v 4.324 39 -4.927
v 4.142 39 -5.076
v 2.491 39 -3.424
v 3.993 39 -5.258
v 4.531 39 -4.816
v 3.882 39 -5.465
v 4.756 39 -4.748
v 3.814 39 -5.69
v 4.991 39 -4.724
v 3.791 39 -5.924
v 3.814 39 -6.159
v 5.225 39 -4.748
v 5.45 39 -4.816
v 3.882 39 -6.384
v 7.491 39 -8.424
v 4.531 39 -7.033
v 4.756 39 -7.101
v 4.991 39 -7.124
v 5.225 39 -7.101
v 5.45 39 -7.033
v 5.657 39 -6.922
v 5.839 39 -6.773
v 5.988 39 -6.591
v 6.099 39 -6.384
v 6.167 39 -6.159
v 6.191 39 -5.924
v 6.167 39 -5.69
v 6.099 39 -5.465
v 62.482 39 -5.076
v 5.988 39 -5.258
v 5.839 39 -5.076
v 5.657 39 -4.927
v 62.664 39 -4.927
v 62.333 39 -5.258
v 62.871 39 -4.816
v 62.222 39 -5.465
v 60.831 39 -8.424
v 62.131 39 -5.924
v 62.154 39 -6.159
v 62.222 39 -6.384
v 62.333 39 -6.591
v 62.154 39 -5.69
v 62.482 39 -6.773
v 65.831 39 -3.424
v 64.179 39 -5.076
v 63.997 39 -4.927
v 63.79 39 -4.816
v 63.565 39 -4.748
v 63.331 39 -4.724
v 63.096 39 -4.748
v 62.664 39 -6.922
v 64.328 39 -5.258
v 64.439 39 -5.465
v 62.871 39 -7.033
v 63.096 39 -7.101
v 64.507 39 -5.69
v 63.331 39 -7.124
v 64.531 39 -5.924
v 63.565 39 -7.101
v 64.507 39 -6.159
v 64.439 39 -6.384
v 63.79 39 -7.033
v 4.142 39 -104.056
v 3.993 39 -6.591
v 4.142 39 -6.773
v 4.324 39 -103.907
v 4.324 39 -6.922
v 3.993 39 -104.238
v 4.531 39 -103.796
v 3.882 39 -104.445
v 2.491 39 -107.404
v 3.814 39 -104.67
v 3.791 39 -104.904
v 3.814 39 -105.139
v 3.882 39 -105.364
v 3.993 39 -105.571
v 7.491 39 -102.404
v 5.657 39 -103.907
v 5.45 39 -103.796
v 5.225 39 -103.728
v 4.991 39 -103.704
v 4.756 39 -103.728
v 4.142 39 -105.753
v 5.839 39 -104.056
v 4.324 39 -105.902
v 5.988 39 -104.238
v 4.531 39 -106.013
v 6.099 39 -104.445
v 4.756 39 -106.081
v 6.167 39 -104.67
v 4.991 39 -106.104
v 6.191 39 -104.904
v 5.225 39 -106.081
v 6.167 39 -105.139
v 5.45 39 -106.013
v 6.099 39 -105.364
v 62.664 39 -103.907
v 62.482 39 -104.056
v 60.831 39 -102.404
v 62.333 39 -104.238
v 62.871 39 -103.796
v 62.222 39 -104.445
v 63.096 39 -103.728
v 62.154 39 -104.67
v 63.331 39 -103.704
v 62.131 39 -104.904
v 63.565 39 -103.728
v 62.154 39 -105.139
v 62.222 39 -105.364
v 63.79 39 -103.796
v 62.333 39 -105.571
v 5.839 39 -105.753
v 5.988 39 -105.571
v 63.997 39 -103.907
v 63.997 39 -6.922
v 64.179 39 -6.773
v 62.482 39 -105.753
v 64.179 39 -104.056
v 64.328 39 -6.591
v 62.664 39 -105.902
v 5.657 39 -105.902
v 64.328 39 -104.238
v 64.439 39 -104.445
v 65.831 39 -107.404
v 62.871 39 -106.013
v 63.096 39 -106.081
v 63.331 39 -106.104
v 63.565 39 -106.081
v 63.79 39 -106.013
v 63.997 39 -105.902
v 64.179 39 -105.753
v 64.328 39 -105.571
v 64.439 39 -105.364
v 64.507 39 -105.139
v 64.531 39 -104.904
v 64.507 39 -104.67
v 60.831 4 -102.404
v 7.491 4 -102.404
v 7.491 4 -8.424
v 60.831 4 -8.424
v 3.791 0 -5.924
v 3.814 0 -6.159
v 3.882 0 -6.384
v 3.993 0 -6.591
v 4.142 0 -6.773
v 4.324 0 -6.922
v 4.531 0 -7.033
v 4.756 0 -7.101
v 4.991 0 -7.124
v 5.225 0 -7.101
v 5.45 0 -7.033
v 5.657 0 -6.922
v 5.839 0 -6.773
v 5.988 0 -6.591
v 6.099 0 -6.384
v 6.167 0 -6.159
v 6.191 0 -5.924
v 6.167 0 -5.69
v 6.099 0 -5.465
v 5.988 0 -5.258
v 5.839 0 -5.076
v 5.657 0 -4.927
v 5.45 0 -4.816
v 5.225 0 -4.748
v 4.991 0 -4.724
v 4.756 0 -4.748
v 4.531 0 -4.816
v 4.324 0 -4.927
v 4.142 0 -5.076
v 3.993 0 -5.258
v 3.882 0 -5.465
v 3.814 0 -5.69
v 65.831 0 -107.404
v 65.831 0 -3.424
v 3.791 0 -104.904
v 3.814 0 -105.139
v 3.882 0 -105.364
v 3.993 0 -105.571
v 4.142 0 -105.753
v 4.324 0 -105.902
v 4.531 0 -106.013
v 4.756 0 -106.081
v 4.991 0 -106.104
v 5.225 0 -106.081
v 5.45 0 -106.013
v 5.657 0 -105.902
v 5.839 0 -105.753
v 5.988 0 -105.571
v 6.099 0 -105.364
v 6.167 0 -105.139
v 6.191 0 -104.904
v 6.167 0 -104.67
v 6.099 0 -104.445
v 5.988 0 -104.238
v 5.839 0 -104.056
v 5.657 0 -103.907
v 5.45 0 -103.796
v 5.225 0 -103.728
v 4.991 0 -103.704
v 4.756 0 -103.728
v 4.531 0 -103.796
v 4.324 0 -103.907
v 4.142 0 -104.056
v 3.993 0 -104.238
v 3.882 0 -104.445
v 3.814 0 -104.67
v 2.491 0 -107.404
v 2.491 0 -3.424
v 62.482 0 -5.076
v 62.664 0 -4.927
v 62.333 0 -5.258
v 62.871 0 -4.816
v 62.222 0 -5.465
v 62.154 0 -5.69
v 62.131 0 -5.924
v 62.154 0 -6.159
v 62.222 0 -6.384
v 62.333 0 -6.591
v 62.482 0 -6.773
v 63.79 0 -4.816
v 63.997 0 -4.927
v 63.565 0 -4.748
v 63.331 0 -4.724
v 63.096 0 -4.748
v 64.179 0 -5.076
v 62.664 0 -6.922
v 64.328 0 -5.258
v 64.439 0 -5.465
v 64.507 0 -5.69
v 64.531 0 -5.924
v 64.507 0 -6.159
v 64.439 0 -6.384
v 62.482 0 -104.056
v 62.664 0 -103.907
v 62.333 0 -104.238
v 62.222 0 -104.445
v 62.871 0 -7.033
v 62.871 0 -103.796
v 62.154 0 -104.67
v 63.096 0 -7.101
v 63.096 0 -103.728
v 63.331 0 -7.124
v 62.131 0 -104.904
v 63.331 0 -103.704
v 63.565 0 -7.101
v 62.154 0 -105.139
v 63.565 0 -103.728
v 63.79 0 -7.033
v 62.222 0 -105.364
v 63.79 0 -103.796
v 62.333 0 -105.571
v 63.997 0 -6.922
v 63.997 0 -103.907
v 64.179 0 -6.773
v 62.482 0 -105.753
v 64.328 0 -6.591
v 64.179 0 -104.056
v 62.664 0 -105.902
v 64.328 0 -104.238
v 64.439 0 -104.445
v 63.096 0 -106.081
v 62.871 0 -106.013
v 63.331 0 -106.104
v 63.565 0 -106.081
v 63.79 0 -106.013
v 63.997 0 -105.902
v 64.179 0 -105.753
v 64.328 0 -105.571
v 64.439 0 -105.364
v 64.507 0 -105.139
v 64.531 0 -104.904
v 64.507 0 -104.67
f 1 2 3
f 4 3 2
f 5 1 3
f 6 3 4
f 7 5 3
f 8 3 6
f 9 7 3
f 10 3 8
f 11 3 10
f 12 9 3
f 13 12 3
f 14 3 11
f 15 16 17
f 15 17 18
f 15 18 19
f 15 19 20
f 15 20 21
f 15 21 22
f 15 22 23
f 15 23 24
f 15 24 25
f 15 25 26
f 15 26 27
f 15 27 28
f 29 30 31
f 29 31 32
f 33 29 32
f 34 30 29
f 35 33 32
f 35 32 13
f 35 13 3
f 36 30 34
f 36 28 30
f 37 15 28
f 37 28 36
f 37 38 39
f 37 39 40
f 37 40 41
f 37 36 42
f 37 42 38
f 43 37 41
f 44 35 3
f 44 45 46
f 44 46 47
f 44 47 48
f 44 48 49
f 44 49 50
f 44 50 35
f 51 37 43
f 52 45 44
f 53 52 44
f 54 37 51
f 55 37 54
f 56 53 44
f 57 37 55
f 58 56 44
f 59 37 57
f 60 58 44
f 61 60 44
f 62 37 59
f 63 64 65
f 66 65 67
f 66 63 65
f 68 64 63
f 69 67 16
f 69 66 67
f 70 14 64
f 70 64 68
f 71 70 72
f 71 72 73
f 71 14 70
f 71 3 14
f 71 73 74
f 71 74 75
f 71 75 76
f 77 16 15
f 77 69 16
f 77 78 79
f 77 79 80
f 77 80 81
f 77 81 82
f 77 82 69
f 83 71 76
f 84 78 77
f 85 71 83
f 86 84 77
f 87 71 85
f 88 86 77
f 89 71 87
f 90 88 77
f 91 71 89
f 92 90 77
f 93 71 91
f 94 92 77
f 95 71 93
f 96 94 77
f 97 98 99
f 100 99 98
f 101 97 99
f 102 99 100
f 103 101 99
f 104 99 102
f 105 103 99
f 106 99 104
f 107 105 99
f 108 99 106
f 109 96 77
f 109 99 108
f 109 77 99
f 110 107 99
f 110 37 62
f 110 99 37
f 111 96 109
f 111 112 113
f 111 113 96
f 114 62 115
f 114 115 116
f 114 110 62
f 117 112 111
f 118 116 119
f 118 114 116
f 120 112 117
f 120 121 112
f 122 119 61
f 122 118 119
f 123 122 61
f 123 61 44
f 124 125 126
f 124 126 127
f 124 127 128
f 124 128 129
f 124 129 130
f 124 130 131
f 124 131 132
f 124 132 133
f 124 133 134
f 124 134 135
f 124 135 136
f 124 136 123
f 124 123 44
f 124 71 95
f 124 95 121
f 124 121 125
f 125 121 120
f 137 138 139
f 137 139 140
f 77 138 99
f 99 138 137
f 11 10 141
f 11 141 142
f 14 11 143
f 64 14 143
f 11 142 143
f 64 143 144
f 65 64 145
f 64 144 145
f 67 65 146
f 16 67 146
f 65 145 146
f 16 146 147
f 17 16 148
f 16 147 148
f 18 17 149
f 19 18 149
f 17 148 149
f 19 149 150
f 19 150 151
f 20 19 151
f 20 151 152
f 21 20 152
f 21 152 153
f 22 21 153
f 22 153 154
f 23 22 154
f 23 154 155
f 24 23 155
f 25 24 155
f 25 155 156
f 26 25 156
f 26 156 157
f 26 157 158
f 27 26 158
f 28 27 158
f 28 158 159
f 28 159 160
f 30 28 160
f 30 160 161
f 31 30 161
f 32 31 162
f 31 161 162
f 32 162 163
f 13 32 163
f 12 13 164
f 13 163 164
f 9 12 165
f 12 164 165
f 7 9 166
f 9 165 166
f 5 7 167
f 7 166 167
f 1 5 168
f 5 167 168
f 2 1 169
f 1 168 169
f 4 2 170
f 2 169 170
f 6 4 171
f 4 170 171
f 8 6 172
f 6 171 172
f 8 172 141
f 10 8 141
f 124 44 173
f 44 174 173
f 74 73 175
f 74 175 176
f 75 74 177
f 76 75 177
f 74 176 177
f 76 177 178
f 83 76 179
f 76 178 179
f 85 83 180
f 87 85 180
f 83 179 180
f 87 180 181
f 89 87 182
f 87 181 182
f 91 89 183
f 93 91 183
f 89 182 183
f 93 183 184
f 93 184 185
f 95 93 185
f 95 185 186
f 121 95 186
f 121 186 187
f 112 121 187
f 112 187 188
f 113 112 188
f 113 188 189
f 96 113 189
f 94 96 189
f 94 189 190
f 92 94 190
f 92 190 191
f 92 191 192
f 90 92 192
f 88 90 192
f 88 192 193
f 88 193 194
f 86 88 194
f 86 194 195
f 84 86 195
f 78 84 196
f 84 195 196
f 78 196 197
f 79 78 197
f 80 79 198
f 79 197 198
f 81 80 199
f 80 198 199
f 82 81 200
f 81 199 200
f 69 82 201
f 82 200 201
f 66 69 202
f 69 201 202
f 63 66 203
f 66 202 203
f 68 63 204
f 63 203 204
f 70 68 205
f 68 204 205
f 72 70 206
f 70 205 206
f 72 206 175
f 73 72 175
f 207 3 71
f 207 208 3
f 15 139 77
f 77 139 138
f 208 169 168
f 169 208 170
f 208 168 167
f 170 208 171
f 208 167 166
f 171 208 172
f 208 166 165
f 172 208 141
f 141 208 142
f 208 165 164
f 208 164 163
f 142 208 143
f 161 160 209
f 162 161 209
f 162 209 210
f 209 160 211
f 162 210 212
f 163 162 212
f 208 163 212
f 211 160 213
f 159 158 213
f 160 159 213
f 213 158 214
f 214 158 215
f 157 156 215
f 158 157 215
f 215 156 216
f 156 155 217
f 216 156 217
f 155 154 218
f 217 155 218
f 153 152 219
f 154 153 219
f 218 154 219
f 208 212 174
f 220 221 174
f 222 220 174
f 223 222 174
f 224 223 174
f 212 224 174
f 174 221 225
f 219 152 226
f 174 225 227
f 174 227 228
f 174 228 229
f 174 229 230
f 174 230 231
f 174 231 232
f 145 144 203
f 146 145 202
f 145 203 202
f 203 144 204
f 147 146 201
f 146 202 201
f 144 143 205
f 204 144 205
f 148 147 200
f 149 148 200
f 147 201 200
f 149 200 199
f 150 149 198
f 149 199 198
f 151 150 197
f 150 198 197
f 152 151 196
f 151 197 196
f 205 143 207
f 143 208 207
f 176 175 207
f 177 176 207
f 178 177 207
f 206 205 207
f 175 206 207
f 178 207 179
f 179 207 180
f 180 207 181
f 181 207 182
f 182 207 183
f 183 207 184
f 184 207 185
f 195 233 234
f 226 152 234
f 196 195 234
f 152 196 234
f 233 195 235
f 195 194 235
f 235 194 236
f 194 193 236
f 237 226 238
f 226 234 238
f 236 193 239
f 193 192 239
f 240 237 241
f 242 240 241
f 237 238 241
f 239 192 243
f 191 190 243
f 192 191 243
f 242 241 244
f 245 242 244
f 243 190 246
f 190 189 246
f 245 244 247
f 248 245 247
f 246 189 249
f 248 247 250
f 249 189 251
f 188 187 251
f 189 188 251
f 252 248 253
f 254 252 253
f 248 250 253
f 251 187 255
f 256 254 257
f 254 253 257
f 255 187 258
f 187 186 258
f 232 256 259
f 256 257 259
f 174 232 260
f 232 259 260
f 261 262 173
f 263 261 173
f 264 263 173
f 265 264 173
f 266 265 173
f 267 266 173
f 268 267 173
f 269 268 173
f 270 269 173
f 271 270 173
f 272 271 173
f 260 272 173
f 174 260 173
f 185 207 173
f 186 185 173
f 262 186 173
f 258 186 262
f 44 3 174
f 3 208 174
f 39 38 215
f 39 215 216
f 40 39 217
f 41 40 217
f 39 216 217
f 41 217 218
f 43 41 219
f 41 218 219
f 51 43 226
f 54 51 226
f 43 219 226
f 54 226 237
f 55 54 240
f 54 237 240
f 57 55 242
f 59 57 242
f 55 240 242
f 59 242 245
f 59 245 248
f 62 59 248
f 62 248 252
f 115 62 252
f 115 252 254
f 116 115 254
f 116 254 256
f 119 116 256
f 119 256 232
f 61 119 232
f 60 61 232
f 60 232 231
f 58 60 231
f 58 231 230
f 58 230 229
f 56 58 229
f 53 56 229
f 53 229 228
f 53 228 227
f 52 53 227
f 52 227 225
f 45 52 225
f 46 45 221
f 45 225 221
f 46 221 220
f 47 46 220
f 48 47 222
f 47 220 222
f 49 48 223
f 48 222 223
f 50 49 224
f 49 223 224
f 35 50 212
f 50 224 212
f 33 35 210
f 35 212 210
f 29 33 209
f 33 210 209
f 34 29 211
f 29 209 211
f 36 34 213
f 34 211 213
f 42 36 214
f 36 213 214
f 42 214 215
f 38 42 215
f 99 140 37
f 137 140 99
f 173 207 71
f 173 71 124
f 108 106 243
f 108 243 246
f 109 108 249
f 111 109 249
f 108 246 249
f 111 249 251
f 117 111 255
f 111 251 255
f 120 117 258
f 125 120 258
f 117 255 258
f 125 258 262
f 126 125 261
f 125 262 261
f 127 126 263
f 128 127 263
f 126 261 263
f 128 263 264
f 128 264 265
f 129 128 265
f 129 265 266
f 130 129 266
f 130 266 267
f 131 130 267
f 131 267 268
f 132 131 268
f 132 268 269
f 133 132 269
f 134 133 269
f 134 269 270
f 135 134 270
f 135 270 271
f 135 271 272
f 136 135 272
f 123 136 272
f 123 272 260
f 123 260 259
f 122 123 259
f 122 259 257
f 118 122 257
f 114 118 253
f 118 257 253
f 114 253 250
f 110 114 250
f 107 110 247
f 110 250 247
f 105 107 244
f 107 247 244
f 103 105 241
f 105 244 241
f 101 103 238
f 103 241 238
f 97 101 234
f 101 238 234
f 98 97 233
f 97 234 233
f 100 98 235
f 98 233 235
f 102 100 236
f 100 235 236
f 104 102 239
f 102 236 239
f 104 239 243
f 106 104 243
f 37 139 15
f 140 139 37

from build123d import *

# Parameters (mm, degrees)
SCHIZZO1_W                   = 63.34
SCHIZZO1_H                   = 103.98
ESTRUSIONE_ESTRUSIONE1_DEPTH = 4
SCHIZZO2_W                   = 63.34
SCHIZZO2_H                   = 103.98
SCHIZZO2_W_2                 = 53.34
SCHIZZO2_H_2                 = 93.98
ESTRUSIONE_ESTRUSIONE2_DEPTH = 35
FORO_PER_VITE_M2_1_D         = 2.4


with BuildPart() as part:
    # Schizzo1 → Estrusione-Estrusione1 (new body)
    with BuildSketch(Plane(origin=(0, 0, 0), x_dir=(1, 0, 0), z_dir=(0, 1, 0))):
        with Locations((34.160538922, 55.414491018)):
            Rectangle(SCHIZZO1_W, SCHIZZO1_H)
    extrude(amount=ESTRUSIONE_ESTRUSIONE1_DEPTH)

    # Schizzo2 → Estrusione-Estrusione2 (add)
    with BuildSketch(Plane(origin=(0, 4, 0), x_dir=(1, 0, 0), z_dir=(0, 1, 0))):
        with Locations((34.160538922, 55.414491018)):
            Rectangle(SCHIZZO2_W, SCHIZZO2_H)
        with Locations((34.160538922, 55.414491018)):
            Rectangle(SCHIZZO2_W_2, SCHIZZO2_H_2, mode=Mode.SUBTRACT)
    extrude(amount=ESTRUSIONE_ESTRUSIONE2_DEPTH)

    # Foro per Vite M2-1 (through all)
    with Locations(Plane(origin=(0, 39, 0), x_dir=(1, 0, 0), z_dir=(0, 1, 0))):
        with Locations((4.990538922, 104.904491018), (63.330538922, 104.904491018), (63.330538922, 5.924491018), (4.990538922, 5.924491018)):
            Hole(FORO_PER_VITE_M2_1_D / 2)


solid = part.part
